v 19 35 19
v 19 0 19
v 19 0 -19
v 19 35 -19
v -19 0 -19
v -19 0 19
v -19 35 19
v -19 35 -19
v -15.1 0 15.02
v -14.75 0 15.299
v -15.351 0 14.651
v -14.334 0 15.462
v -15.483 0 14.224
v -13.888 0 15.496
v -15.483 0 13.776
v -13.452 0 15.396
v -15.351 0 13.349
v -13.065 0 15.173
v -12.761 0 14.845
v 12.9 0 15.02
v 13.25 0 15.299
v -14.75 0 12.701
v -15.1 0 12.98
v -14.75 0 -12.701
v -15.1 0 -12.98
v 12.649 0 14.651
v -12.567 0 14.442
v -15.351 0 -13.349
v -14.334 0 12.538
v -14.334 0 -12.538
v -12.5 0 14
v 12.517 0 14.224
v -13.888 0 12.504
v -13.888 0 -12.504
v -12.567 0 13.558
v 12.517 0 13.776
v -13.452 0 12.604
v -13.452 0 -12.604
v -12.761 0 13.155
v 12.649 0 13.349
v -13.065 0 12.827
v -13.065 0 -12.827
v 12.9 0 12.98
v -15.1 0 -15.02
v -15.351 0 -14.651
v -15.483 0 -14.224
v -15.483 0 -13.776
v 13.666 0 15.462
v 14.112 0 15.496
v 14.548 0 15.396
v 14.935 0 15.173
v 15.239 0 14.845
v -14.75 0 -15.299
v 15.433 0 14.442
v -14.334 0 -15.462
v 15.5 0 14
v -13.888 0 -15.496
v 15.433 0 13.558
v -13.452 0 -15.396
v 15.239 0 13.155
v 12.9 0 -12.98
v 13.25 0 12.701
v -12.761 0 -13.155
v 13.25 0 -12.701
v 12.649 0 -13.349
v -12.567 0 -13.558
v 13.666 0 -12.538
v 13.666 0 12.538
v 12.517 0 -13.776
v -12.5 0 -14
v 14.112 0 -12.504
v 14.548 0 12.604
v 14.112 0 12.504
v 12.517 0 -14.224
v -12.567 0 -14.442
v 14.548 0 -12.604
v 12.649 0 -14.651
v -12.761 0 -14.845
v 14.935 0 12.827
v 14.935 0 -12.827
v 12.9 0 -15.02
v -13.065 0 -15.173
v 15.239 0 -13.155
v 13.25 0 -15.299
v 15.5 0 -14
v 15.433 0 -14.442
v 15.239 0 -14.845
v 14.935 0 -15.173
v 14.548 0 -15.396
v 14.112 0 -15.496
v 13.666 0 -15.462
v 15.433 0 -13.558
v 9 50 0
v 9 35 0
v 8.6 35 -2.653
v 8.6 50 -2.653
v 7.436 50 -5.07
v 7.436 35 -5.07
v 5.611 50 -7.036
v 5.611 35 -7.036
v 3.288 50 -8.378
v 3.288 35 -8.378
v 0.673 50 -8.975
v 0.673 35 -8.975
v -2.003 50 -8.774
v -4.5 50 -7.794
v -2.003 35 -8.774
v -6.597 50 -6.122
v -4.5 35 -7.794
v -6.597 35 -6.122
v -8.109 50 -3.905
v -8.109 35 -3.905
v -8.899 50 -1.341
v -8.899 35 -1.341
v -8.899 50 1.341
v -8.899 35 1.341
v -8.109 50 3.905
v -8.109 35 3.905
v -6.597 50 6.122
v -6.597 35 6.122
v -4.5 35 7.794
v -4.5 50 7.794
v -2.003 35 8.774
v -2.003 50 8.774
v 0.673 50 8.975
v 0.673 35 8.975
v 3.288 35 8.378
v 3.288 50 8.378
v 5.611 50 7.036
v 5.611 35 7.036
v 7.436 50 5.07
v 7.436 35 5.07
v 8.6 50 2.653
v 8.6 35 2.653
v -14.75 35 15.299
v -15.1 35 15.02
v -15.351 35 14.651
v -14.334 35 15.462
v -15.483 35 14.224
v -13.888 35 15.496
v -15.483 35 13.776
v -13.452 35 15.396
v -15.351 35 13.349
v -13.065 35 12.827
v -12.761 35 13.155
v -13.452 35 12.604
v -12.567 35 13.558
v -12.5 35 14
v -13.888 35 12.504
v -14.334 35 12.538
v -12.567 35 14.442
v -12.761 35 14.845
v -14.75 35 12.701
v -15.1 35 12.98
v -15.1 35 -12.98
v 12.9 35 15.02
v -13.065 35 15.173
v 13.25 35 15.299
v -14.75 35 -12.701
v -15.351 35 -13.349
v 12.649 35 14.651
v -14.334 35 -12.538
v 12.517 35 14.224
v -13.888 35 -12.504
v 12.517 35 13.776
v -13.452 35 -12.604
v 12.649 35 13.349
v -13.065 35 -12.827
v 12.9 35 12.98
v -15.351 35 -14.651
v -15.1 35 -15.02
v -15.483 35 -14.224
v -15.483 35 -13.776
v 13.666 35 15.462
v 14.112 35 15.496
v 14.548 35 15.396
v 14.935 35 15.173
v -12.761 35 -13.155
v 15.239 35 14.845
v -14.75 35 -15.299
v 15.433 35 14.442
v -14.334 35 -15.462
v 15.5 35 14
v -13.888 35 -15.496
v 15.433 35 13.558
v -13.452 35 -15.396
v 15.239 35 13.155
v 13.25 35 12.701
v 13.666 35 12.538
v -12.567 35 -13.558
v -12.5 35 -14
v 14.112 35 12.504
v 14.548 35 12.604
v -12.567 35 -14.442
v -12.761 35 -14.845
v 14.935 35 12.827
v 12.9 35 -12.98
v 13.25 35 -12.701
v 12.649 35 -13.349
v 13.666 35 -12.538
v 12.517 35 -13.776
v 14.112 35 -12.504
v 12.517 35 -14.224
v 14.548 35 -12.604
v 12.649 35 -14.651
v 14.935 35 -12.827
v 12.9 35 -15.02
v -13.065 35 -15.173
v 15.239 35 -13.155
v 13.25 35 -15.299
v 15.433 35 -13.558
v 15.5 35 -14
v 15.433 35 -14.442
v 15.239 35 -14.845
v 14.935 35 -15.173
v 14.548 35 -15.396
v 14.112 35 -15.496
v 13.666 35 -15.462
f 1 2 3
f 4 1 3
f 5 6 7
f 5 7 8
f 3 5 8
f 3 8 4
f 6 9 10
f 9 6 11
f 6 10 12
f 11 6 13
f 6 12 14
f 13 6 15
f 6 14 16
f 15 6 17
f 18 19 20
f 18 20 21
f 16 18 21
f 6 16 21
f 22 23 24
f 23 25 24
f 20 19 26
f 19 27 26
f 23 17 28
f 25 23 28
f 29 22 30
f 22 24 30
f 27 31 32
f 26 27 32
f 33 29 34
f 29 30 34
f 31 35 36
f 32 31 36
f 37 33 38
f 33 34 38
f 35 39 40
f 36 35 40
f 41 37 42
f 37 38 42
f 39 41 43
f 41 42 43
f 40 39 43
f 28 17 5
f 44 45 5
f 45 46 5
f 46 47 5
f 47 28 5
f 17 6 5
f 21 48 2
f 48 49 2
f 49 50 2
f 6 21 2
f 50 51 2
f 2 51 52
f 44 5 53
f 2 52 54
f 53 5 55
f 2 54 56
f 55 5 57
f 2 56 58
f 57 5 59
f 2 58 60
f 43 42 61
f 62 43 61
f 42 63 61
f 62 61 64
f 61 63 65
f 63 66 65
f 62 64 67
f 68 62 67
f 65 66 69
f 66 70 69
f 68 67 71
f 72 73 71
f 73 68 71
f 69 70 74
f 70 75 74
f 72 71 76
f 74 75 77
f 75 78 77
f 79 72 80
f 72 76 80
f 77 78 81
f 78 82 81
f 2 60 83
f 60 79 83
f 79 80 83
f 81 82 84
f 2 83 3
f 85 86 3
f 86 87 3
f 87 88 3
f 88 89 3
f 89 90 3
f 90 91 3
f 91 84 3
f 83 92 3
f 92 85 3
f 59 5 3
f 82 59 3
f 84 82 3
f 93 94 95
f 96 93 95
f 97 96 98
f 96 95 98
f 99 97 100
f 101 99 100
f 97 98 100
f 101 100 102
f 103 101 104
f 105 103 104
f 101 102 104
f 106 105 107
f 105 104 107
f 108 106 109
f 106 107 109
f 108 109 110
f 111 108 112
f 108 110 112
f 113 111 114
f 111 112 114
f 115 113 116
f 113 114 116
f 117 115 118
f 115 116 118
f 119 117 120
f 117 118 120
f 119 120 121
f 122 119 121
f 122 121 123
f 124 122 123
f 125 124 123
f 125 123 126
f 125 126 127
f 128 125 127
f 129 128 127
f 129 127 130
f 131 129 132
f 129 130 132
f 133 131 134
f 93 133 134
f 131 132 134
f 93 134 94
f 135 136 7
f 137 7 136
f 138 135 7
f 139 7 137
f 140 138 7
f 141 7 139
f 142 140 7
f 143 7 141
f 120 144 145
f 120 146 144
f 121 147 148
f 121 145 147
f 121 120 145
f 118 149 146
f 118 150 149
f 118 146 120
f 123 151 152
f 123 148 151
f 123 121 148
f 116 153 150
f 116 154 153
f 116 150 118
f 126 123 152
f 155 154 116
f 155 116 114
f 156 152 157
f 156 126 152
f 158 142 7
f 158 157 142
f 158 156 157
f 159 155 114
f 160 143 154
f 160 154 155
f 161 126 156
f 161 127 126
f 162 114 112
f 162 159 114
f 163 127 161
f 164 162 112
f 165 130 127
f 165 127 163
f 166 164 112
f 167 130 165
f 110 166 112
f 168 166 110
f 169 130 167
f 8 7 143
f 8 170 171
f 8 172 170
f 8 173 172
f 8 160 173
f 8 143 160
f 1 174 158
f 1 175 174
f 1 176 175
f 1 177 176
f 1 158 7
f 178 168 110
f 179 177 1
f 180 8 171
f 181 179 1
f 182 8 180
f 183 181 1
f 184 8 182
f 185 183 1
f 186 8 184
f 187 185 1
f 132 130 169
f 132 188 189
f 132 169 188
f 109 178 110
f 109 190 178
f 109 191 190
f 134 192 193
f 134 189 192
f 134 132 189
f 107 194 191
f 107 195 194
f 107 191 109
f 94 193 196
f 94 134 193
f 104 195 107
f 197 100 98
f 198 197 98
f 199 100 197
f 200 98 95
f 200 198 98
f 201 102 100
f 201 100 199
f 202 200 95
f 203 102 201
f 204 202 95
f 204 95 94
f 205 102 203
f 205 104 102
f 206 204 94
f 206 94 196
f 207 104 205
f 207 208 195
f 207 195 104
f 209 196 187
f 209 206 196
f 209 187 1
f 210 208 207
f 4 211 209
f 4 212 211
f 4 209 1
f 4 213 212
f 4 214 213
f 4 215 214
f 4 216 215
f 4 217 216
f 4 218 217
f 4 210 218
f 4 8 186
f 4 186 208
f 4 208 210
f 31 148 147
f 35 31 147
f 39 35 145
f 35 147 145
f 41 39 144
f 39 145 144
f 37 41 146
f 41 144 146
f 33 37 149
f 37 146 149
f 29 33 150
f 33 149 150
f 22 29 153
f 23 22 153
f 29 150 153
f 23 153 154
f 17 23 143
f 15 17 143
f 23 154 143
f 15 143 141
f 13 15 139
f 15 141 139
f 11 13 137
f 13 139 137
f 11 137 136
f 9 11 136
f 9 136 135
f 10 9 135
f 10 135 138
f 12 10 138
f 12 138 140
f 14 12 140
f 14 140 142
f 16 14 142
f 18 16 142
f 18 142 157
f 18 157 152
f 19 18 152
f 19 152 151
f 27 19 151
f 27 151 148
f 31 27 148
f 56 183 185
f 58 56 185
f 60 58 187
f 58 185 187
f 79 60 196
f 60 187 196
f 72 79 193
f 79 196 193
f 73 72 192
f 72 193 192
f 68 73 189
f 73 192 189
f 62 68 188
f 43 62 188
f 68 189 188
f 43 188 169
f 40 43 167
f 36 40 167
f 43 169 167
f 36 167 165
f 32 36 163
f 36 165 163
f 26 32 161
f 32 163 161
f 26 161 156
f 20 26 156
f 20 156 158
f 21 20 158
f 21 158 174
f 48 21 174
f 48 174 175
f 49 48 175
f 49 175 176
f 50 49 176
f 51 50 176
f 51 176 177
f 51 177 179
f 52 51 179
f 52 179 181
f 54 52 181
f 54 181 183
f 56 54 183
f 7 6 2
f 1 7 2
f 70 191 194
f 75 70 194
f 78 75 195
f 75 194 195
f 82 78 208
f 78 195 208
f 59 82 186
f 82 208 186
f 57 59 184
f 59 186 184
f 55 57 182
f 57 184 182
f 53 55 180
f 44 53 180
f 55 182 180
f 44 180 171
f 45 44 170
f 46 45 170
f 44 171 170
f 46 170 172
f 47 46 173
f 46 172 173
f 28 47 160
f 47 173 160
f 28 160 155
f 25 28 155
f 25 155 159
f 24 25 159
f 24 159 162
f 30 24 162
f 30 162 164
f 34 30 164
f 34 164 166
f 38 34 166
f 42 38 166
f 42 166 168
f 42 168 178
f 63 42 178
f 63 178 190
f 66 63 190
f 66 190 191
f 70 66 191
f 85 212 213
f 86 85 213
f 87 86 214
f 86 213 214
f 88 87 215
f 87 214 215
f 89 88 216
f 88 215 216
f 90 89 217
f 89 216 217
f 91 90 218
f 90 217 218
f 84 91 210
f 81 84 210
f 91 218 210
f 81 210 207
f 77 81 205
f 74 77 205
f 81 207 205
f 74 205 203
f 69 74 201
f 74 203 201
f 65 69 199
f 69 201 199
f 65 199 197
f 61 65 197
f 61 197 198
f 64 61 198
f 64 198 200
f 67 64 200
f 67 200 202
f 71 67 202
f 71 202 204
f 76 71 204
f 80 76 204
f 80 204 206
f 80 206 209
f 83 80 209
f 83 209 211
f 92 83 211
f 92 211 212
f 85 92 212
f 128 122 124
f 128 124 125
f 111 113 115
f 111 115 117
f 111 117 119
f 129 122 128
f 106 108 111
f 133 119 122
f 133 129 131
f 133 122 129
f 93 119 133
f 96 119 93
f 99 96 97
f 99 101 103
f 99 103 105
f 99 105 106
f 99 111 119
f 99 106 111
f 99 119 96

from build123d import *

# Parameters (mm, degrees)
SKETCH1_W             = 38
SKETCH1_H             = 38
BOSS_EXTRUDE1_DEPTH   = 35
SKETCH2_R             = 9
BOSS_EXTRUDE2_DEPTH   = 15
F_3_0MM_DOWEL_HOLE1_D = 3


with BuildPart() as part:
    # Sketch1 → Boss-Extrude1 (new body)
    with BuildSketch(Plane(origin=(0, 0, 0), x_dir=(1, 0, 0), z_dir=(0, 1, 0))):
        Rectangle(SKETCH1_W, SKETCH1_H)
    extrude(amount=BOSS_EXTRUDE1_DEPTH)

    # Sketch2 → Boss-Extrude2 (add)
    with BuildSketch(Plane(origin=(0, 35, 0), x_dir=(1, 0, 0), z_dir=(0, 1, 0))):
        Circle(SKETCH2_R)
    extrude(amount=BOSS_EXTRUDE2_DEPTH)

    # Ø3.0mm Dowel Hole1 (through all)
    with Locations(Plane(origin=(0, 0, 0), x_dir=(-1, 0, 0), z_dir=(0, -1, 0))):
        with Locations((-14, -14), (-14, 14), (14, 14), (14, -14)):
            Hole(F_3_0MM_DOWEL_HOLE1_D / 2)


solid = part.part
